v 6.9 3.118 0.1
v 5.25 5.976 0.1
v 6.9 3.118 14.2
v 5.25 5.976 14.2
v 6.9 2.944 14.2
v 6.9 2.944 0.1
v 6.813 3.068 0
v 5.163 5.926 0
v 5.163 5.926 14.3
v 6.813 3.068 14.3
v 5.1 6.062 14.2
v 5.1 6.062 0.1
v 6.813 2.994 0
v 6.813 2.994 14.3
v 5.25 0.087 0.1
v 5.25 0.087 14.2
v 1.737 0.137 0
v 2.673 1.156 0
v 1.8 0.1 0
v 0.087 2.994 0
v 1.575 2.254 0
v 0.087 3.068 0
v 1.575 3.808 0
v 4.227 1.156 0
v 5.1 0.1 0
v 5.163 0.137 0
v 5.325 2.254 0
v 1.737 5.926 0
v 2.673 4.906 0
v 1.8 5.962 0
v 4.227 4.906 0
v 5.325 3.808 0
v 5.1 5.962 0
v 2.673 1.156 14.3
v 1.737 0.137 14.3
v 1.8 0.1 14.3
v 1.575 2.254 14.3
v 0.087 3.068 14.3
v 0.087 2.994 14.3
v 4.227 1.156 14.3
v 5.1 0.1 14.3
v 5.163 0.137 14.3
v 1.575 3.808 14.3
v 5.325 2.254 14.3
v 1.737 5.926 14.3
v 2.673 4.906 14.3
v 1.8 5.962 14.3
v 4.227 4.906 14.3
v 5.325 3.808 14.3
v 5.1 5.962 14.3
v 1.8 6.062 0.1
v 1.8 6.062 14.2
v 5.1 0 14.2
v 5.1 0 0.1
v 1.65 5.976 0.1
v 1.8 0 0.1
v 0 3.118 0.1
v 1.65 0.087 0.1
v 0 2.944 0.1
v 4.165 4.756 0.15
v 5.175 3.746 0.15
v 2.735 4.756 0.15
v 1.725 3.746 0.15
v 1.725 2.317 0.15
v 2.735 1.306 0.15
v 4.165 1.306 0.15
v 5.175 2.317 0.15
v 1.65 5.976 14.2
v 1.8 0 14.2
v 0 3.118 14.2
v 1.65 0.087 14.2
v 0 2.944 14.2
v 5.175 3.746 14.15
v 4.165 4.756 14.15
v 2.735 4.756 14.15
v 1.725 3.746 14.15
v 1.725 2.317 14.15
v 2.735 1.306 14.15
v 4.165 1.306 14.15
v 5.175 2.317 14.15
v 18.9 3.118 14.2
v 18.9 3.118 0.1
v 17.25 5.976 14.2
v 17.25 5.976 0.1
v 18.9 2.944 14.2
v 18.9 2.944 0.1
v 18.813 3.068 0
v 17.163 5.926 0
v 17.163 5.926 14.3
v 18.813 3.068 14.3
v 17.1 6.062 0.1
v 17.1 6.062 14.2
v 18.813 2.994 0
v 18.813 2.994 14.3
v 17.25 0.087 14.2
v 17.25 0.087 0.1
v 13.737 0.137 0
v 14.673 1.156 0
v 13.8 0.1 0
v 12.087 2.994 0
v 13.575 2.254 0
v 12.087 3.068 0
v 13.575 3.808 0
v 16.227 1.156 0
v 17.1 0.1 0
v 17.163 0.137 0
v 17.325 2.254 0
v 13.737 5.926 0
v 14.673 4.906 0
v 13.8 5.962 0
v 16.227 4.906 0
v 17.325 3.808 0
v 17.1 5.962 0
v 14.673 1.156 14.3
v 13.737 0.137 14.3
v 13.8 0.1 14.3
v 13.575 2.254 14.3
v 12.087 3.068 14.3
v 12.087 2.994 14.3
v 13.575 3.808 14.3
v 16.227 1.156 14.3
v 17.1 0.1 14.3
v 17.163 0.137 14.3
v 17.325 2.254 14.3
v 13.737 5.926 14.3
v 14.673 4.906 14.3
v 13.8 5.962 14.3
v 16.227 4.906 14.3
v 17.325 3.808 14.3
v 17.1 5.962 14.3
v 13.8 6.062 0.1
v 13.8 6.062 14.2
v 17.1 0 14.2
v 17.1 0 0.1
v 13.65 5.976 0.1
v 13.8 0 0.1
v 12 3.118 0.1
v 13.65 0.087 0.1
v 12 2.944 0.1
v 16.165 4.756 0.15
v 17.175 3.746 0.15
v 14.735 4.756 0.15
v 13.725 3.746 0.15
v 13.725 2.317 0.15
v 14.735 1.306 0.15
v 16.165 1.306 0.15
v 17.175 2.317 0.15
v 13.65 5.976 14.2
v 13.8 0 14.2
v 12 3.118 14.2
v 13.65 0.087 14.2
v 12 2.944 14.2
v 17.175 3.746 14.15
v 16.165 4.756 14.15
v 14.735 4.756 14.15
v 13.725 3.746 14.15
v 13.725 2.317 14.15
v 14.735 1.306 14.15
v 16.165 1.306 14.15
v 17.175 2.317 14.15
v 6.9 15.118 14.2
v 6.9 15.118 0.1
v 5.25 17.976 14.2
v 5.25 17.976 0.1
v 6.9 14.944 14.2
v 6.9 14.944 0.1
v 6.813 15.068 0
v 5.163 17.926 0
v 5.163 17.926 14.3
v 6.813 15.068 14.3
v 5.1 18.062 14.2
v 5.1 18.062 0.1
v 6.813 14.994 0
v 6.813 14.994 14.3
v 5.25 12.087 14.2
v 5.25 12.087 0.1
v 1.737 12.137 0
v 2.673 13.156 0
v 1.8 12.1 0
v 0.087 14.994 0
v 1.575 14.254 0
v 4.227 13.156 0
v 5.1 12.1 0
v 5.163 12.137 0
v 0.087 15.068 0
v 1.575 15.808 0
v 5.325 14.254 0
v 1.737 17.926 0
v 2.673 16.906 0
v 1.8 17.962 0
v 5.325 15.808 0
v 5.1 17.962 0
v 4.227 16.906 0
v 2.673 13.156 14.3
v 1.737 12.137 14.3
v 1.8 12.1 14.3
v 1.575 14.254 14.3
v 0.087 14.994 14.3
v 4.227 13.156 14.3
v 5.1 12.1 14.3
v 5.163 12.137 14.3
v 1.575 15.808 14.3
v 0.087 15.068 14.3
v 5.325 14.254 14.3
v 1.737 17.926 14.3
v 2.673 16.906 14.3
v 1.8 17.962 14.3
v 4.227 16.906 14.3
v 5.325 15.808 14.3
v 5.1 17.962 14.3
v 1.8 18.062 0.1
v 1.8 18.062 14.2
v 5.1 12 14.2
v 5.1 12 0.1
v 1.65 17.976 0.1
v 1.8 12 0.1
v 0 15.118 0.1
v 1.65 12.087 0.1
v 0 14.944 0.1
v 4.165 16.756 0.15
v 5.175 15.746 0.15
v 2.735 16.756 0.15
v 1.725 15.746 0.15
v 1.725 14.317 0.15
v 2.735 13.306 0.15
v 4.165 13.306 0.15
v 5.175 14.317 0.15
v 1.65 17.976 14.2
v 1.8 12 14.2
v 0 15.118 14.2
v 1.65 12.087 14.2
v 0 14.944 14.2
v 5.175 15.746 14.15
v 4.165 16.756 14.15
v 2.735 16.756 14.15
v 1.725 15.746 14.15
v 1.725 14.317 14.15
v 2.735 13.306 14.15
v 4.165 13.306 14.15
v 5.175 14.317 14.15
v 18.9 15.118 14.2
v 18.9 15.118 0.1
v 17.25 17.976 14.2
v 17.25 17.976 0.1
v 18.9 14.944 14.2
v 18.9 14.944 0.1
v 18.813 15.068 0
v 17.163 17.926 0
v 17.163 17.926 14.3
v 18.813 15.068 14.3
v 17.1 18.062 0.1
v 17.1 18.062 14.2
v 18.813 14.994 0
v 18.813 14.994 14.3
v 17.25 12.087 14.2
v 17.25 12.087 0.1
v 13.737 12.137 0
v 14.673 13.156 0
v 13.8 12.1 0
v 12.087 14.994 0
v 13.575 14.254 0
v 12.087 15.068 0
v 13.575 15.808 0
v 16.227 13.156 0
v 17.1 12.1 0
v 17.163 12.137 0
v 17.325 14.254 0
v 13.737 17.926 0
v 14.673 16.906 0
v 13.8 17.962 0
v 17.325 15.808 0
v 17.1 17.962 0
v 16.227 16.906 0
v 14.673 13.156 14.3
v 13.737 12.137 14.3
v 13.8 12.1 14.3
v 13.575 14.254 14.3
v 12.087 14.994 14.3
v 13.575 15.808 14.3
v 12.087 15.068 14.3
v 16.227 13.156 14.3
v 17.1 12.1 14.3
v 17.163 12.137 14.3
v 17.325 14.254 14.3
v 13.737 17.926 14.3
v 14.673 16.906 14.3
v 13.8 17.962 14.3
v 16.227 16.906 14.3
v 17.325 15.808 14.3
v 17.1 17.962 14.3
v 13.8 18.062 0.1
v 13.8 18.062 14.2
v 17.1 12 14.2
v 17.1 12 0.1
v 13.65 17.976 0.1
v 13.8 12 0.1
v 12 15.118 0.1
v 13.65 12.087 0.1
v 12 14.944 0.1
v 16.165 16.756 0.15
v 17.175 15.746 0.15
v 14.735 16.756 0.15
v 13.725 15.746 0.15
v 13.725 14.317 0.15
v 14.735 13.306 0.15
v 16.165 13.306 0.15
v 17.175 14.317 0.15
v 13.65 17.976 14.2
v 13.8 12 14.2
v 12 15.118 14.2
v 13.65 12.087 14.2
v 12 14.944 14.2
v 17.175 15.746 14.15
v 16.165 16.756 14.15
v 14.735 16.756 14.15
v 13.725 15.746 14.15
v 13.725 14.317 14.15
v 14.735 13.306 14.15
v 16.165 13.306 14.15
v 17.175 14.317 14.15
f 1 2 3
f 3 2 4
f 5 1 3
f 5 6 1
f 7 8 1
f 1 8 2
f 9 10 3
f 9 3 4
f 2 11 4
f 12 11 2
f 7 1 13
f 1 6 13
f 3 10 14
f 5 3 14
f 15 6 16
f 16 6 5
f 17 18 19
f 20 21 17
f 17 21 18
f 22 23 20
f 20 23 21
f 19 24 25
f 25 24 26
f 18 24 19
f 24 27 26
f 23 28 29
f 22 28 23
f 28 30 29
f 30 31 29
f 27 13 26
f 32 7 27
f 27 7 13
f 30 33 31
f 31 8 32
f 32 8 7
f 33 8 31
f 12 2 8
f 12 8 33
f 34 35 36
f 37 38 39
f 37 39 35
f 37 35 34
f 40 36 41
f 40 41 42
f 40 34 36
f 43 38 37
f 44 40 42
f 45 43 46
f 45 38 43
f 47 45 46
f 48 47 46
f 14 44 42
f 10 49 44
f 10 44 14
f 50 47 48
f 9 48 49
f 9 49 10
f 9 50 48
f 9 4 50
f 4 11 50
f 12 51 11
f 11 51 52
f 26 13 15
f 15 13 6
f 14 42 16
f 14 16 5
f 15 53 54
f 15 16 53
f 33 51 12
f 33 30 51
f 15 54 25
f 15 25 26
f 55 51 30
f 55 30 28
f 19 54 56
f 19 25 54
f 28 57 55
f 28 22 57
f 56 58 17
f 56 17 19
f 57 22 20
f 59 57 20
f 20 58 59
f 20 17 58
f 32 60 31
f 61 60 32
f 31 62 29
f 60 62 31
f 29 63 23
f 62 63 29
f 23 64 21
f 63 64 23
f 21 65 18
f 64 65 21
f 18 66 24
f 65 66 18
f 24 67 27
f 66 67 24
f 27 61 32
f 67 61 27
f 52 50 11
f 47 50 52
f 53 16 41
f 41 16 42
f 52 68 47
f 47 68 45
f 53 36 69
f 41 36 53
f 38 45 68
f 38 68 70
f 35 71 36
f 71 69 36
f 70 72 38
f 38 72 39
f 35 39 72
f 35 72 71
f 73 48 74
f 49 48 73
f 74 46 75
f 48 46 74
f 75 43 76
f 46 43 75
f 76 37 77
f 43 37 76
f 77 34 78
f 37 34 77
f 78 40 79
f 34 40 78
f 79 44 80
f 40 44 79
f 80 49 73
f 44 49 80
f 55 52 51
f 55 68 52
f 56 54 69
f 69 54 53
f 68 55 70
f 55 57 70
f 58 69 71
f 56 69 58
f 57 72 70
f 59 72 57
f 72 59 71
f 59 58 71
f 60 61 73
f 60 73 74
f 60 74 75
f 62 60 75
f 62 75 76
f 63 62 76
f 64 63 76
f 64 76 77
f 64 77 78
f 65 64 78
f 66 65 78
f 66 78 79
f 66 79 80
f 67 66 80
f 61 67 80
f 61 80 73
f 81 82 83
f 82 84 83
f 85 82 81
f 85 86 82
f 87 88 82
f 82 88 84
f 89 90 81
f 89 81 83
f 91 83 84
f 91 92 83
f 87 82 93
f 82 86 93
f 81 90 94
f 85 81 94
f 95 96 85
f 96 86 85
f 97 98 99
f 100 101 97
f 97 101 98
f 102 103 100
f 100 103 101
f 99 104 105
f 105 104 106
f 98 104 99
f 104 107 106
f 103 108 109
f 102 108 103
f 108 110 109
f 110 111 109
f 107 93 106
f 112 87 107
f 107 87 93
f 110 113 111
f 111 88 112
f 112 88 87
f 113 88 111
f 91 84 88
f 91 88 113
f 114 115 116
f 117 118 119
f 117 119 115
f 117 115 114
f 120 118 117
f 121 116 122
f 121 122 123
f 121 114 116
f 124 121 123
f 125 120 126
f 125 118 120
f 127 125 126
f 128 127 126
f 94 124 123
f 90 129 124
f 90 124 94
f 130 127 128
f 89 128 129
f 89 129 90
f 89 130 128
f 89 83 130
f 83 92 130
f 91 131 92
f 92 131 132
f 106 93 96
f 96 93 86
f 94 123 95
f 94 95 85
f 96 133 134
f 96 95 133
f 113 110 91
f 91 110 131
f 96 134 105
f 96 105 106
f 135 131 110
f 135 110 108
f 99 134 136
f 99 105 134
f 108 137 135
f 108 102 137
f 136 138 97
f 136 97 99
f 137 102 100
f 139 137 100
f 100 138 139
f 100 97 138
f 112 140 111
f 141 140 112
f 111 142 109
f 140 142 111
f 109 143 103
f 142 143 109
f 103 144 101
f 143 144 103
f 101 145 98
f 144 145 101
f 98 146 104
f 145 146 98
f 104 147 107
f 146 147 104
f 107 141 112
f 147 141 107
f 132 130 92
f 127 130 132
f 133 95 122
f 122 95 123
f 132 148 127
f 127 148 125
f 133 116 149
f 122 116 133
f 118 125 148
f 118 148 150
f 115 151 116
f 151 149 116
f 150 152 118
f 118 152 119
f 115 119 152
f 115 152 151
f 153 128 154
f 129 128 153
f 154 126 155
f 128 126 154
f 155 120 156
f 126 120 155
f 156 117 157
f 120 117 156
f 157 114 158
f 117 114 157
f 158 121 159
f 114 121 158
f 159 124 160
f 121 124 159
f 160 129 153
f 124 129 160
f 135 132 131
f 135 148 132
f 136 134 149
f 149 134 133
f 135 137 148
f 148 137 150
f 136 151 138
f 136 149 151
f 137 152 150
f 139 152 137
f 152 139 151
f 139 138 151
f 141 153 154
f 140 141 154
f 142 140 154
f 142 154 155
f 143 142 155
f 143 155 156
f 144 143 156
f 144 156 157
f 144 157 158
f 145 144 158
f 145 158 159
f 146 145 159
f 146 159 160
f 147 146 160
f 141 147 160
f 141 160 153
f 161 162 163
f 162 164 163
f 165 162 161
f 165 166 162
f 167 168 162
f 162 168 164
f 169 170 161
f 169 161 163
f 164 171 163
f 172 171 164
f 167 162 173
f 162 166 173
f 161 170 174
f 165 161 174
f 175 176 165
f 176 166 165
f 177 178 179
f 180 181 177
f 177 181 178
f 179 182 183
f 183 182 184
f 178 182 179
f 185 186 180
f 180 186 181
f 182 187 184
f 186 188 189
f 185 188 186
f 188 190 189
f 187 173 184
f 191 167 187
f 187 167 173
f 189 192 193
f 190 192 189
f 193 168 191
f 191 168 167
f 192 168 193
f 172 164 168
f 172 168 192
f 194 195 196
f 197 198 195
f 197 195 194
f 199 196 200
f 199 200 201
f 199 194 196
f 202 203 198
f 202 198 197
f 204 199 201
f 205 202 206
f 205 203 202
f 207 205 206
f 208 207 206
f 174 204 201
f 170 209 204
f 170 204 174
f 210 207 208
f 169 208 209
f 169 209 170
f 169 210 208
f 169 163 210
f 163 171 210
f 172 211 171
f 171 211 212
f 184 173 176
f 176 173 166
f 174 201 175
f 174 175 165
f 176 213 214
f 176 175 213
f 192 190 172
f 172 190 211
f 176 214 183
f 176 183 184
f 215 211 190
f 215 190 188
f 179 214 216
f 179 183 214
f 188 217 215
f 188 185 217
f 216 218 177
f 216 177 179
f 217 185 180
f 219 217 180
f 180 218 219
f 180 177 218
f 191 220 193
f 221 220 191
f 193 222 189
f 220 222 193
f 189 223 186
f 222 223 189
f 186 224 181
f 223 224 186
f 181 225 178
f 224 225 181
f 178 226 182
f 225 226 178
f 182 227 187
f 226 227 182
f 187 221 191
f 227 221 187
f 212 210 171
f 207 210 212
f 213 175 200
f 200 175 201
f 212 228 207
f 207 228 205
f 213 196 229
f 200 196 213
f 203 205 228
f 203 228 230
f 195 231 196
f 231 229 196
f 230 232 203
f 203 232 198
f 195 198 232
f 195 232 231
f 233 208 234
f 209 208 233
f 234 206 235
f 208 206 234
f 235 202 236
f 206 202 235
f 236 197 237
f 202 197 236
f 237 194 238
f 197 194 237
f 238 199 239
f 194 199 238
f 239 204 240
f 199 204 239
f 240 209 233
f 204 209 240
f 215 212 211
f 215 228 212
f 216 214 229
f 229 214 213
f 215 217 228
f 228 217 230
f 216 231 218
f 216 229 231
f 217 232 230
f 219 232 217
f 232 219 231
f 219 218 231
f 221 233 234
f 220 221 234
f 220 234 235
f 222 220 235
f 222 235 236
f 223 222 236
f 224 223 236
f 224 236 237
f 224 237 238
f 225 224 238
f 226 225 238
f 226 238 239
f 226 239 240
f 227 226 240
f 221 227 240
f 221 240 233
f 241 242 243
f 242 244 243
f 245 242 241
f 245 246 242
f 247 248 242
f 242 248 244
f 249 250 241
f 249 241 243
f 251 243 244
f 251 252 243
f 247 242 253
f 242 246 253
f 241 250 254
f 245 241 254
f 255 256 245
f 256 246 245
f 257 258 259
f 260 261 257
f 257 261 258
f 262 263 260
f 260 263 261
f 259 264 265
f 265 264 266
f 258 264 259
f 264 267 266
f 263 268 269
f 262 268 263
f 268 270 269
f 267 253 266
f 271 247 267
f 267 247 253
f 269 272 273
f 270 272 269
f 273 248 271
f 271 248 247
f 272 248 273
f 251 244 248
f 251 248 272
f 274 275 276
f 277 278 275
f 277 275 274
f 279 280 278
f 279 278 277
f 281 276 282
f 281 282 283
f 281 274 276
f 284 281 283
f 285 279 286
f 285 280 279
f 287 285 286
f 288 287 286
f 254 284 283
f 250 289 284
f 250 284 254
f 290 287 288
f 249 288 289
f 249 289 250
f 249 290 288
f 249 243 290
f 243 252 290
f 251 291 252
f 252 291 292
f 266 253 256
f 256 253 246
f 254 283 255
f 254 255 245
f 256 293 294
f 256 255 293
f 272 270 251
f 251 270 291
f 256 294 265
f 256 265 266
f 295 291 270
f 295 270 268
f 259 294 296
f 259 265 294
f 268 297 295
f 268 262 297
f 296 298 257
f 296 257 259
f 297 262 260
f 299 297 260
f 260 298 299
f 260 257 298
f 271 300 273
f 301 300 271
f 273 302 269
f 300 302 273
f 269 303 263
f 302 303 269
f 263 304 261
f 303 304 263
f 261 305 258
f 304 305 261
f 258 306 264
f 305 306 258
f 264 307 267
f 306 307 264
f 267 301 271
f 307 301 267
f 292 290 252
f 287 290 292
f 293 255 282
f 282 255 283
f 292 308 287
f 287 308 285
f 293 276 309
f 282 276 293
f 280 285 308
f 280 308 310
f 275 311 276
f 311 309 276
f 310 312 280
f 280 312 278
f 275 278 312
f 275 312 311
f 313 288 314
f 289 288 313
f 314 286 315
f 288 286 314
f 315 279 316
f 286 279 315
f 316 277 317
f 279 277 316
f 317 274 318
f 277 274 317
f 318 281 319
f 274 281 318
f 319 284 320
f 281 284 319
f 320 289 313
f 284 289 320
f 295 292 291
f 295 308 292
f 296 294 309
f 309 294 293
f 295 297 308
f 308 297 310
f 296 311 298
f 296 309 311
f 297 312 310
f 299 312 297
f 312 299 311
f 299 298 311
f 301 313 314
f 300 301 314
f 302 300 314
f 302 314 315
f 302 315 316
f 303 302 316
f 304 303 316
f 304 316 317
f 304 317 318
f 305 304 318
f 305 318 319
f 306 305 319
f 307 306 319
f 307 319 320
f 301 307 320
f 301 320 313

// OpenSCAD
// Generated variant: spec/build_parent_main_polygon.py.
polyhedron(points=[[6.900000095367432, 3.1176915168762207, 0.10000009834766388], [5.25, 5.9755754470825195, 0.10000009834766388], [6.900000095367432, 3.1176915168762207, 14.199999809265137], [5.25, 5.9755754470825195, 14.199999809265137], [6.900000095367432, 2.944486379623413, 14.199999809265137], [6.900000095367432, 2.944486379623413, 0.10000009834766388], [6.813397407531738, 3.0676915645599365, 1.0000000116860974e-07], [5.163397312164307, 5.925575256347656, 1.0000000116860974e-07], [5.163397312164307, 5.925575256347656, 14.300000190734863], [6.813397407531738, 3.0676915645599365, 14.300000190734863], [5.099999904632568, 6.062177658081055, 14.199999809265137], [5.099999904632568, 6.062177658081055, 0.10000009834766388], [6.813397407531738, 2.9944863319396973, 1.0000000116860974e-07], [6.813397407531738, 2.9944863319396973, 14.300000190734863], [5.25, 0.08660253882408142, 0.10000009834766388], [5.25, 0.08660253882408142, 14.199999809265137], [1.736602544784546, 0.13660253584384918, 1.0000000116860974e-07], [2.673349618911743, 1.156088948249817, 1.0000000116860974e-07], [1.7999999523162842, 0.10000000149011612, 1.0000000116860974e-07], [0.08660253882408142, 2.9944863319396973, 1.0000000116860974e-07], [1.5750000476837158, 2.2544384002685547, 1.0000000116860974e-07], [0.08660253882408142, 3.0676915645599365, 1.0000000116860974e-07], [1.5750000476837158, 3.8077392578125, 1.0000000116860974e-07], [4.226650238037109, 1.156088948249817, 1.0000000116860974e-07], [5.099999904632568, 0.10000000149011612, 1.0000000116860974e-07], [5.163397312164307, 0.13660253584384918, 1.0000000116860974e-07], [5.324999809265137, 2.2544384002685547, 1.0000000116860974e-07], [1.736602544784546, 5.925575256347656, 1.0000000116860974e-07], [2.673349618911743, 4.906088829040527, 1.0000000116860974e-07], [1.7999999523162842, 5.962177753448486, 1.0000000116860974e-07], [4.226650238037109, 4.906088829040527, 1.0000000116860974e-07], [5.324999809265137, 3.8077392578125, 1.0000000116860974e-07], [5.099999904632568, 5.962177753448486, 1.0000000116860974e-07], [2.673349618911743, 1.156088948249817, 14.300000190734863], [1.736602544784546, 0.13660253584384918, 14.300000190734863], [1.7999999523162842, 0.10000000149011612, 14.300000190734863], [1.5750000476837158, 2.2544384002685547, 14.300000190734863], [0.08660253882408142, 3.0676915645599365, 14.300000190734863], [0.08660253882408142, 2.9944863319396973, 14.300000190734863], [4.226650238037109, 1.156088948249817, 14.300000190734863], [5.099999904632568, 0.10000000149011612, 14.300000190734863], [5.163397312164307, 0.13660253584384918, 14.300000190734863], [1.5750000476837158, 3.8077392578125, 14.300000190734863], [5.324999809265137, 2.2544384002685547, 14.300000190734863], [1.736602544784546, 5.925575256347656, 14.300000190734863], [2.673349618911743, 4.906088829040527, 14.300000190734863], [1.7999999523162842, 5.962177753448486, 14.300000190734863], [4.226650238037109, 4.906088829040527, 14.300000190734863], [5.324999809265137, 3.8077392578125, 14.300000190734863], [5.099999904632568, 5.962177753448486, 14.300000190734863], [1.7999999523162842, 6.062177658081055, 0.10000009834766388], [1.7999999523162842, 6.062177658081055, 14.199999809265137], [5.099999904632568, 4.440892098500626e-16, 14.199999809265137], [5.099999904632568, 0.0, 0.10000009834766388], [1.649999976158142, 5.9755754470825195, 0.10000009834766388], [1.7999999523162842, 4.440892098500626e-16, 0.10000009834766388], [1.7763568394002505e-15, 3.1176915168762207, 0.10000009834766388], [1.649999976158142, 0.08660253882408142, 0.10000009834766388], [1.7763568394002505e-15, 2.944486379623413, 0.10000009834766388], [4.164518356323242, 4.756088733673096, 0.15000009536743164], [5.175000190734863, 3.745607376098633, 0.15000009536743164], [2.7354815006256104, 4.756088733673096, 0.15000009536743164], [1.725000023841858, 3.745607376098633, 0.15000009536743164], [1.725000023841858, 2.316570520401001, 0.15000009536743164], [2.7354815006256104, 1.306088924407959, 0.15000009536743164], [4.164518356323242, 1.306088924407959, 0.15000009536743164], [5.175000190734863, 2.316570520401001, 0.15000009536743164], [1.649999976158142, 5.9755754470825195, 14.199999809265137], [1.7999999523162842, 8.881784197001252e-16, 14.199999809265137], [8.881784197001252e-16, 3.1176915168762207, 14.199999809265137], [1.649999976158142, 0.08660253882408142, 14.199999809265137], [1.7763568394002505e-15, 2.944486379623413, 14.199999809265137], [5.175000190734863, 3.745607376098633, 14.15000057220459], [4.164518356323242, 4.756088733673096, 14.15000057220459], [2.7354815006256104, 4.756088733673096, 14.15000057220459], [1.725000023841858, 3.745607376098633, 14.15000057220459], [1.725000023841858, 2.316570520401001, 14.15000057220459], [2.7354815006256104, 1.306088924407959, 14.15000057220459], [4.164518356323242, 1.306088924407959, 14.15000057220459], [5.175000190734863, 2.316570520401001, 14.15000057220459], [18.899999618530273, 3.1176915168762207, 14.199999809265137], [18.899999618530273, 3.1176915168762207, 0.10000009834766388], [17.25, 5.9755754470825195, 14.199999809265137], [17.25, 5.9755754470825195, 0.10000009834766388], [18.899999618530273, 2.944486379623413, 14.199999809265137], [18.899999618530273, 2.944486379623413, 0.10000009834766388], [18.813398361206055, 3.0676915645599365, 1.0000000116860974e-07], [17.16339683532715, 5.925575256347656, 1.0000000116860974e-07], [17.16339683532715, 5.925575256347656, 14.300000190734863], [18.813398361206055, 3.0676915645599365, 14.300000190734863], [17.100000381469727, 6.062177658081055, 0.10000009834766388], [17.100000381469727, 6.062177658081055, 14.199999809265137], [18.813398361206055, 2.9944863319396973, 1.0000000116860974e-07], [18.813398361206055, 2.9944863319396973, 14.300000190734863], [17.25, 0.08660253882408142, 14.199999809265137], [17.25, 0.08660253882408142, 0.10000009834766388], [13.736602783203125, 0.13660253584384918, 1.0000000116860974e-07], [14.673349380493164, 1.156088948249817, 1.0000000116860974e-07], [13.800000190734863, 0.10000000149011612, 1.0000000116860974e-07], [12.086602210998535, 2.9944863319396973, 1.0000000116860974e-07], [13.574999809265137, 2.2544384002685547, 1.0000000116860974e-07], [12.086602210998535, 3.0676915645599365, 1.0000000116860974e-07], [13.574999809265137, 3.8077392578125, 1.0000000116860974e-07], [16.22665023803711, 1.156088948249817, 1.0000000116860974e-07], [17.100000381469727, 0.10000000149011612, 1.0000000116860974e-07], [17.16339683532715, 0.13660253584384918, 1.0000000116860974e-07], [17.325000762939453, 2.2544384002685547, 1.0000000116860974e-07], [13.736602783203125, 5.925575256347656, 1.0000000116860974e-07], [14.673349380493164, 4.906088829040527, 1.0000000116860974e-07], [13.800000190734863, 5.962177753448486, 1.0000000116860974e-07], [16.22665023803711, 4.906088829040527, 1.0000000116860974e-07], [17.325000762939453, 3.8077392578125, 1.0000000116860974e-07], [17.100000381469727, 5.962177753448486, 1.0000000116860974e-07], [14.673349380493164, 1.156088948249817, 14.300000190734863], [13.736602783203125, 0.13660253584384918, 14.300000190734863], [13.800000190734863, 0.10000000149011612, 14.300000190734863], [13.574999809265137, 2.2544384002685547, 14.300000190734863], [12.086602210998535, 3.0676915645599365, 14.300000190734863], [12.086602210998535, 2.9944863319396973, 14.300000190734863], [13.574999809265137, 3.8077392578125, 14.300000190734863], [16.22665023803711, 1.156088948249817, 14.300000190734863], [17.100000381469727, 0.10000000149011612, 14.300000190734863], [17.16339683532715, 0.13660253584384918, 14.300000190734863], [17.325000762939453, 2.2544384002685547, 14.300000190734863], [13.736602783203125, 5.925575256347656, 14.300000190734863], [14.673349380493164, 4.906088829040527, 14.300000190734863], [13.800000190734863, 5.962177753448486, 14.300000190734863], [16.22665023803711, 4.906088829040527, 14.300000190734863], [17.325000762939453, 3.8077392578125, 14.300000190734863], [17.100000381469727, 5.962177753448486, 14.300000190734863], [13.800000190734863, 6.062177658081055, 0.10000009834766388], [13.800000190734863, 6.062177658081055, 14.199999809265137], [17.100000381469727, 4.440892098500626e-16, 14.199999809265137], [17.100000381469727, 0.0, 0.10000009834766388], [13.649999618530273, 5.9755754470825195, 0.10000009834766388], [13.800000190734863, 4.440892098500626e-16, 0.10000009834766388], [12.0, 3.1176915168762207, 0.10000009834766388], [13.649999618530273, 0.08660253882408142, 0.10000009834766388], [12.0, 2.944486379623413, 0.10000009834766388], [16.164518356323242, 4.756088733673096, 0.15000009536743164], [17.174999237060547, 3.745607376098633, 0.15000009536743164], [14.735481262207031, 4.756088733673096, 0.15000009536743164], [13.725000381469727, 3.745607376098633, 0.15000009536743164], [13.725000381469727, 2.316570520401001, 0.15000009536743164], [14.735481262207031, 1.306088924407959, 0.15000009536743164], [16.164518356323242, 1.306088924407959, 0.15000009536743164], [17.174999237060547, 2.316570520401001, 0.15000009536743164], [13.649999618530273, 5.9755754470825195, 14.199999809265137], [13.800000190734863, 8.881784197001252e-16, 14.199999809265137], [12.0, 3.1176915168762207, 14.199999809265137], [13.649999618530273, 0.08660253882408142, 14.199999809265137], [12.0, 2.944486379623413, 14.199999809265137], [17.174999237060547, 3.745607376098633, 14.15000057220459], [16.164518356323242, 4.756088733673096, 14.15000057220459], [14.735481262207031, 4.756088733673096, 14.15000057220459], [13.725000381469727, 3.745607376098633, 14.15000057220459], [13.725000381469727, 2.316570520401001, 14.15000057220459], [14.735481262207031, 1.306088924407959, 14.15000057220459], [16.164518356323242, 1.306088924407959, 14.15000057220459], [17.174999237060547, 2.316570520401001, 14.15000057220459], [6.900000095367432, 15.117691040039062, 14.199999809265137], [6.900000095367432, 15.117691040039062, 0.10000009834766388], [5.25, 17.975574493408203, 14.199999809265137], [5.25, 17.975574493408203, 0.10000009834766388], [6.900000095367432, 14.944486618041992, 14.199999809265137], [6.900000095367432, 14.944486618041992, 0.10000009834766388], [6.813397407531738, 15.067691802978516, 1.0000000116860974e-07], [5.163397312164307, 17.925575256347656, 1.0000000116860974e-07], [5.163397312164307, 17.925575256347656, 14.300000190734863], [6.813397407531738, 15.067691802978516, 14.300000190734863], [5.099999904632568, 18.062177658081055, 14.199999809265137], [5.099999904632568, 18.062177658081055, 0.10000009834766388], [6.813397407531738, 14.994486808776855, 1.0000000116860974e-07], [6.813397407531738, 14.994486808776855, 14.300000190734863], [5.25, 12.086602210998535, 14.199999809265137], [5.25, 12.086602210998535, 0.10000009834766388], [1.736602544784546, 12.136602401733398, 1.0000000116860974e-07], [2.673349618911743, 13.156088829040527, 1.0000000116860974e-07], [1.7999999523162842, 12.100000381469727, 1.0000000116860974e-07], [0.08660253882408142, 14.994486808776855, 1.0000000116860974e-07], [1.5750000476837158, 14.254438400268555, 1.0000000116860974e-07], [4.226650238037109, 13.156088829040527, 1.0000000116860974e-07], [5.099999904632568, 12.100000381469727, 1.0000000116860974e-07], [5.163397312164307, 12.136602401733398, 1.0000000116860974e-07], [0.08660253882408142, 15.067691802978516, 1.0000000116860974e-07], [1.5750000476837158, 15.8077392578125, 1.0000000116860974e-07], [5.324999809265137, 14.254438400268555, 1.0000000116860974e-07], [1.736602544784546, 17.925575256347656, 1.0000000116860974e-07], [2.673349618911743, 16.906089782714844, 1.0000000116860974e-07], [1.7999999523162842, 17.962177276611328, 1.0000000116860974e-07], [5.324999809265137, 15.8077392578125, 1.0000000116860974e-07], [5.099999904632568, 17.962177276611328, 1.0000000116860974e-07], [4.226650238037109, 16.906089782714844, 1.0000000116860974e-07], [2.673349618911743, 13.156088829040527, 14.300000190734863], [1.736602544784546, 12.136602401733398, 14.300000190734863], [1.7999999523162842, 12.100000381469727, 14.300000190734863], [1.5750000476837158, 14.254438400268555, 14.300000190734863], [0.08660253882408142, 14.994486808776855, 14.300000190734863], [4.226650238037109, 13.156088829040527, 14.300000190734863], [5.099999904632568, 12.100000381469727, 14.300000190734863], [5.163397312164307, 12.136602401733398, 14.300000190734863], [1.5750000476837158, 15.8077392578125, 14.300000190734863], [0.08660253882408142, 15.067691802978516, 14.300000190734863], [5.324999809265137, 14.254438400268555, 14.300000190734863], [1.736602544784546, 17.925575256347656, 14.300000190734863], [2.673349618911743, 16.906089782714844, 14.300000190734863], [1.7999999523162842, 17.962177276611328, 14.300000190734863], [4.226650238037109, 16.906089782714844, 14.300000190734863], [5.324999809265137, 15.8077392578125, 14.300000190734863], [5.099999904632568, 17.962177276611328, 14.300000190734863], [1.7999999523162842, 18.062177658081055, 0.10000009834766388], [1.7999999523162842, 18.062177658081055, 14.199999809265137], [5.099999904632568, 12.0, 14.199999809265137], [5.099999904632568, 12.0, 0.10000009834766388], [1.649999976158142, 17.975574493408203, 0.10000009834766388], [1.7999999523162842, 12.0, 0.10000009834766388], [1.7763568394002505e-15, 15.117691040039062, 0.10000009834766388], [1.649999976158142, 12.086602210998535, 0.10000009834766388], [1.7763568394002505e-15, 14.944486618041992, 0.10000009834766388], [4.164518356323242, 16.756088256835938, 0.15000009536743164], [5.175000190734863, 15.745607376098633, 0.15000009536743164], [2.7354815006256104, 16.756088256835938, 0.15000009536743164], [1.725000023841858, 15.745607376098633, 0.15000009536743164], [1.725000023841858, 14.316570281982422, 0.15000009536743164], [2.7354815006256104, 13.3060884475708, 0.15000009536743164], [4.164518356323242, 13.3060884475708, 0.15000009536743164], [5.175000190734863, 14.316570281982422, 0.15000009536743164], [1.649999976158142, 17.975574493408203, 14.199999809265137], [1.7999999523162842, 12.0, 14.199999809265137], [8.881784197001252e-16, 15.117691040039062, 14.199999809265137], [1.649999976158142, 12.086602210998535, 14.199999809265137], [1.7763568394002505e-15, 14.944486618041992, 14.199999809265137], [5.175000190734863, 15.745607376098633, 14.15000057220459], [4.164518356323242, 16.756088256835938, 14.15000057220459], [2.7354815006256104, 16.756088256835938, 14.15000057220459], [1.725000023841858, 15.745607376098633, 14.15000057220459], [1.725000023841858, 14.316570281982422, 14.15000057220459], [2.7354815006256104, 13.3060884475708, 14.15000057220459], [4.164518356323242, 13.3060884475708, 14.15000057220459], [5.175000190734863, 14.316570281982422, 14.15000057220459], [18.899999618530273, 15.117691040039062, 14.199999809265137], [18.899999618530273, 15.117691040039062, 0.10000009834766388], [17.25, 17.975574493408203, 14.199999809265137], [17.25, 17.975574493408203, 0.10000009834766388], [18.899999618530273, 14.944486618041992, 14.199999809265137], [18.899999618530273, 14.944486618041992, 0.10000009834766388], [18.813398361206055, 15.067691802978516, 1.0000000116860974e-07], [17.16339683532715, 17.925575256347656, 1.0000000116860974e-07], [17.16339683532715, 17.925575256347656, 14.300000190734863], [18.813398361206055, 15.067691802978516, 14.300000190734863], [17.100000381469727, 18.062177658081055, 0.10000009834766388], [17.100000381469727, 18.062177658081055, 14.199999809265137], [18.813398361206055, 14.994486808776855, 1.0000000116860974e-07], [18.813398361206055, 14.994486808776855, 14.300000190734863], [17.25, 12.086602210998535, 14.199999809265137], [17.25, 12.086602210998535, 0.10000009834766388], [13.736602783203125, 12.136602401733398, 1.0000000116860974e-07], [14.673349380493164, 13.156088829040527, 1.0000000116860974e-07], [13.800000190734863, 12.100000381469727, 1.0000000116860974e-07], [12.086602210998535, 14.994486808776855, 1.0000000116860974e-07], [13.574999809265137, 14.254438400268555, 1.0000000116860974e-07], [12.086602210998535, 15.067691802978516, 1.0000000116860974e-07], [13.574999809265137, 15.8077392578125, 1.0000000116860974e-07], [16.22665023803711, 13.156088829040527, 1.0000000116860974e-07], [17.100000381469727, 12.100000381469727, 1.0000000116860974e-07], [17.16339683532715, 12.136602401733398, 1.0000000116860974e-07], [17.325000762939453, 14.254438400268555, 1.0000000116860974e-07], [13.736602783203125, 17.925575256347656, 1.0000000116860974e-07], [14.673349380493164, 16.906089782714844, 1.0000000116860974e-07], [13.800000190734863, 17.962177276611328, 1.0000000116860974e-07], [17.325000762939453, 15.8077392578125, 1.0000000116860974e-07], [17.100000381469727, 17.962177276611328, 1.0000000116860974e-07], [16.22665023803711, 16.906089782714844, 1.0000000116860974e-07], [14.673349380493164, 13.156088829040527, 14.300000190734863], [13.736602783203125, 12.136602401733398, 14.300000190734863], [13.800000190734863, 12.100000381469727, 14.300000190734863], [13.574999809265137, 14.254438400268555, 14.300000190734863], [12.086602210998535, 14.994486808776855, 14.300000190734863], [13.574999809265137, 15.8077392578125, 14.300000190734863], [12.086602210998535, 15.067691802978516, 14.300000190734863], [16.22665023803711, 13.156088829040527, 14.300000190734863], [17.100000381469727, 12.100000381469727, 14.300000190734863], [17.16339683532715, 12.136602401733398, 14.300000190734863], [17.325000762939453, 14.254438400268555, 14.300000190734863], [13.736602783203125, 17.925575256347656, 14.300000190734863], [14.673349380493164, 16.906089782714844, 14.300000190734863], [13.800000190734863, 17.962177276611328, 14.300000190734863], [16.22665023803711, 16.906089782714844, 14.300000190734863], [17.325000762939453, 15.8077392578125, 14.300000190734863], [17.100000381469727, 17.962177276611328, 14.300000190734863], [13.800000190734863, 18.062177658081055, 0.10000009834766388], [13.800000190734863, 18.062177658081055, 14.199999809265137], [17.100000381469727, 12.0, 14.199999809265137], [17.100000381469727, 12.0, 0.10000009834766388], [13.649999618530273, 17.975574493408203, 0.10000009834766388], [13.800000190734863, 12.0, 0.10000009834766388], [12.0, 15.117691040039062, 0.10000009834766388], [13.649999618530273, 12.086602210998535, 0.10000009834766388], [12.0, 14.944486618041992, 0.10000009834766388], [16.164518356323242, 16.756088256835938, 0.15000009536743164], [17.174999237060547, 15.745607376098633, 0.15000009536743164], [14.735481262207031, 16.756088256835938, 0.15000009536743164], [13.725000381469727, 15.745607376098633, 0.15000009536743164], [13.725000381469727, 14.316570281982422, 0.15000009536743164], [14.735481262207031, 13.3060884475708, 0.15000009536743164], [16.164518356323242, 13.3060884475708, 0.15000009536743164], [17.174999237060547, 14.316570281982422, 0.15000009536743164], [13.649999618530273, 17.975574493408203, 14.199999809265137], [13.800000190734863, 12.0, 14.199999809265137], [12.0, 15.117691040039062, 14.199999809265137], [13.649999618530273, 12.086602210998535, 14.199999809265137], [12.0, 14.944486618041992, 14.199999809265137], [17.174999237060547, 15.745607376098633, 14.15000057220459], [16.164518356323242, 16.756088256835938, 14.15000057220459], [14.735481262207031, 16.756088256835938, 14.15000057220459], [13.725000381469727, 15.745607376098633, 14.15000057220459], [13.725000381469727, 14.316570281982422, 14.15000057220459], [14.735481262207031, 13.3060884475708, 14.15000057220459], [16.164518356323242, 13.3060884475708, 14.15000057220459], [17.174999237060547, 14.316570281982422, 14.15000057220459]],faces=[[2, 1, 0], [3, 1, 2], [2, 0, 4], [0, 5, 4], [0, 7, 6], [1, 7, 0], [2, 9, 8], [3, 2, 8], [3, 10, 1], [1, 10, 11], [12, 0, 6], [12, 5, 0], [13, 9, 2], [13, 2, 4], [15, 5, 14], [4, 5, 15], [18, 17, 16], [16, 20, 19], [17, 20, 16], [19, 22, 21], [20, 22, 19], [24, 23, 18], [25, 23, 24], [18, 23, 17], [25, 26, 23], [28, 27, 22], [22, 27, 21], [28, 29, 27], [28, 30, 29], [25, 12, 26], [26, 6, 31], [12, 6, 26], [30, 32, 29], [31, 7, 30], [6, 7, 31], [30, 7, 32], [7, 1, 11], [32, 7, 11], [35, 34, 33], [38, 37, 36], [34, 38, 36], [33, 34, 36], [40, 35, 39], [41, 40, 39], [35, 33, 39], [36, 37, 42], [41, 39, 43], [45, 42, 44], [42, 37, 44], [45, 44, 46], [45, 46, 47], [41, 43, 13], [43, 48, 9], [13, 43, 9], [47, 46, 49], [48, 47, 8], [9, 48, 8], [47, 49, 8], [49, 3, 8], [49, 10, 3], [10, 50, 11], [51, 50, 10], [14, 12, 25], [5, 12, 14], [15, 41, 13], [4, 15, 13], [53, 52, 14], [52, 15, 14], [11, 50, 32], [50, 29, 32], [24, 53, 14], [25, 24, 14], [29, 50, 54], [27, 29, 54], [55, 53, 18], [53, 24, 18], [54, 56, 27], [56, 21, 27], [16, 57, 55], [18, 16, 55], [19, 21, 56], [19, 56, 58], [58, 57, 19], [57, 16, 19], [30, 59, 31], [31, 59, 60], [28, 61, 30], [30, 61, 59], [22, 62, 28], [28, 62, 61], [20, 63, 22], [22, 63, 62], [17, 64, 20], [20, 64, 63], [23, 65, 17], [17, 65, 64], [26, 66, 23], [23, 66, 65], [31, 60, 26], [26, 60, 66], [10, 49, 51], [51, 49, 46], [40, 15, 52], [41, 15, 40], [46, 67, 51], [44, 67, 46], [68, 35, 52], [52, 35, 40], [67, 44, 37], [69, 67, 37], [35, 70, 34], [35, 68, 70], [37, 71, 69], [38, 71, 37], [71, 38, 34], [70, 71, 34], [73, 47, 72], [72, 47, 48], [74, 45, 73], [73, 45, 47], [75, 42, 74], [74, 42, 45], [76, 36, 75], [75, 36, 42], [77, 33, 76], [76, 33, 36], [78, 39, 77], [77, 39, 33], [79, 43, 78], [78, 43, 39], [72, 48, 79], [79, 48, 43], [50, 51, 54], [51, 67, 54], [68, 53, 55], [52, 53, 68], [69, 54, 67], [69, 56, 54], [70, 68, 57], [57, 68, 55], [69, 71, 56], [56, 71, 58], [70, 58, 71], [70, 57, 58], [72, 60, 59], [73, 72, 59], [74, 73, 59], [74, 59, 61], [75, 74, 61], [75, 61, 62], [75, 62, 63], [76, 75, 63], [77, 76, 63], [77, 63, 64], [77, 64, 65], [78, 77, 65], [79, 78, 65], [79, 65, 66], [79, 66, 60], [72, 79, 60], [82, 81, 80], [82, 83, 81], [80, 81, 84], [81, 85, 84], [81, 87, 86], [83, 87, 81], [80, 89, 88], [82, 80, 88], [83, 82, 90], [82, 91, 90], [92, 81, 86], [92, 85, 81], [93, 89, 80], [93, 80, 84], [84, 95, 94], [84, 85, 95], [98, 97, 96], [96, 100, 99], [97, 100, 96], [99, 102, 101], [100, 102, 99], [104, 103, 98], [105, 103, 104], [98, 103, 97], [105, 106, 103], [108, 107, 102], [102, 107, 101], [108, 109, 107], [108, 110, 109], [105, 92, 106], [106, 86, 111], [92, 86, 106], [110, 112, 109], [111, 87, 110], [86, 87, 111], [110, 87, 112], [87, 83, 90], [112, 87, 90], [115, 114, 113], [118, 117, 116], [114, 118, 116], [113, 114, 116], [116, 117, 119], [121, 115, 120], [122, 121, 120], [115, 113, 120], [122, 120, 123], [125, 119, 124], [119, 117, 124], [125, 124, 126], [125, 126, 127], [122, 123, 93], [123, 128, 89], [93, 123, 89], [127, 126, 129], [128, 127, 88], [89, 128, 88], [127, 129, 88], [129, 82, 88], [129, 91, 82], [91, 130, 90], [131, 130, 91], [95, 92, 105], [85, 92, 95], [94, 122, 93], [84, 94, 93], [133, 132, 95], [132, 94, 95], [90, 109, 112], [130, 109, 90], [104, 133, 95], [105, 104, 95], [109, 130, 134], [107, 109, 134], [135, 133, 98], [133, 104, 98], [134, 136, 107], [136, 101, 107], [96, 137, 135], [98, 96, 135], [99, 101, 136], [99, 136, 138], [138, 137, 99], [137, 96, 99], [110, 139, 111], [111, 139, 140], [108, 141, 110], [110, 141, 139], [102, 142, 108], [108, 142, 141], [100, 143, 102], [102, 143, 142], [97, 144, 100], [100, 144, 143], [103, 145, 97], [97, 145, 144], [106, 146, 103], [103, 146, 145], [111, 140, 106], [106, 140, 146], [91, 129, 131], [131, 129, 126], [121, 94, 132], [122, 94, 121], [126, 147, 131], [124, 147, 126], [148, 115, 132], [132, 115, 121], [147, 124, 117], [149, 147, 117], [115, 150, 114], [115, 148, 150], [117, 151, 149], [118, 151, 117], [151, 118, 114], [150, 151, 114], [153, 127, 152], [152, 127, 128], [154, 125, 153], [153, 125, 127], [155, 119, 154], [154, 119, 125], [156, 116, 155], [155, 116, 119], [157, 113, 156], [156, 113, 116], [158, 120, 157], [157, 120, 113], [159, 123, 158], [158, 123, 120], [152, 128, 159], [159, 128, 123], [130, 131, 134], [131, 147, 134], [148, 133, 135], [132, 133, 148], [147, 136, 134], [149, 136, 147], [137, 150, 135], [150, 148, 135], [149, 151, 136], [136, 151, 138], [150, 138, 151], [150, 137, 138], [153, 152, 140], [153, 140, 139], [153, 139, 141], [154, 153, 141], [154, 141, 142], [155, 154, 142], [155, 142, 143], [156, 155, 143], [157, 156, 143], [157, 143, 144], [158, 157, 144], [158, 144, 145], [159, 158, 145], [159, 145, 146], [159, 146, 140], [152, 159, 140], [162, 161, 160], [162, 163, 161], [160, 161, 164], [161, 165, 164], [161, 167, 166], [163, 167, 161], [160, 169, 168], [162, 160, 168], [162, 170, 163], [163, 170, 171], [172, 161, 166], [172, 165, 161], [173, 169, 160], [173, 160, 164], [164, 175, 174], [164, 165, 175], [178, 177, 176], [176, 180, 179], [177, 180, 176], [182, 181, 178], [183, 181, 182], [178, 181, 177], [179, 185, 184], [180, 185, 179], [183, 186, 181], [188, 187, 185], [185, 187, 184], [188, 189, 187], [183, 172, 186], [186, 166, 190], [172, 166, 186], [192, 191, 188], [188, 191, 189], [190, 167, 192], [166, 167, 190], [192, 167, 191], [167, 163, 171], [191, 167, 171], [195, 194, 193], [194, 197, 196], [193, 194, 196], [199, 195, 198], [200, 199, 198], [195, 193, 198], [197, 202, 201], [196, 197, 201], [200, 198, 203], [205, 201, 204], [201, 202, 204], [205, 204, 206], [205, 206, 207], [200, 203, 173], [203, 208, 169], [173, 203, 169], [207, 206, 209], [208, 207, 168], [169, 208, 168], [207, 209, 168], [209, 162, 168], [209, 170, 162], [170, 210, 171], [211, 210, 170], [175, 172, 183], [165, 172, 175], [174, 200, 173], [164, 174, 173], [213, 212, 175], [212, 174, 175], [171, 189, 191], [210, 189, 171], [182, 213, 175], [183, 182, 175], [189, 210, 214], [187, 189, 214], [215, 213, 178], [213, 182, 178], [214, 216, 187], [216, 184, 187], [176, 217, 215], [178, 176, 215], [179, 184, 216], [179, 216, 218], [218, 217, 179], [217, 176, 179], [192, 219, 190], [190, 219, 220], [188, 221, 192], [192, 221, 219], [185, 222, 188], [188, 222, 221], [180, 223, 185], [185, 223, 222], [177, 224, 180], [180, 224, 223], [181, 225, 177], [177, 225, 224], [186, 226, 181], [181, 226, 225], [190, 220, 186], [186, 220, 226], [170, 209, 211], [211, 209, 206], [199, 174, 212], [200, 174, 199], [206, 227, 211], [204, 227, 206], [228, 195, 212], [212, 195, 199], [227, 204, 202], [229, 227, 202], [195, 230, 194], [195, 228, 230], [202, 231, 229], [197, 231, 202], [231, 197, 194], [230, 231, 194], [233, 207, 232], [232, 207, 208], [234, 205, 233], [233, 205, 207], [235, 201, 234], [234, 201, 205], [236, 196, 235], [235, 196, 201], [237, 193, 236], [236, 193, 196], [238, 198, 237], [237, 198, 193], [239, 203, 238], [238, 203, 198], [232, 208, 239], [239, 208, 203], [210, 211, 214], [211, 227, 214], [228, 213, 215], [212, 213, 228], [227, 216, 214], [229, 216, 227], [217, 230, 215], [230, 228, 215], [229, 231, 216], [216, 231, 218], [230, 218, 231], [230, 217, 218], [233, 232, 220], [233, 220, 219], [234, 233, 219], [234, 219, 221], [235, 234, 221], [235, 221, 222], [235, 222, 223], [236, 235, 223], [237, 236, 223], [237, 223, 224], [237, 224, 225], [238, 237, 225], [239, 238, 225], [239, 225, 226], [239, 226, 220], [232, 239, 220], [242, 241, 240], [242, 243, 241], [240, 241, 244], [241, 245, 244], [241, 247, 246], [243, 247, 241], [240, 249, 248], [242, 240, 248], [243, 242, 250], [242, 251, 250], [252, 241, 246], [252, 245, 241], [253, 249, 240], [253, 240, 244], [244, 255, 254], [244, 245, 255], [258, 257, 256], [256, 260, 259], [257, 260, 256], [259, 262, 261], [260, 262, 259], [264, 263, 258], [265, 263, 264], [258, 263, 257], [265, 266, 263], [268, 267, 262], [262, 267, 261], [268, 269, 267], [265, 252, 266], [266, 246, 270], [252, 246, 266], [272, 271, 268], [268, 271, 269], [270, 247, 272], [246, 247, 270], [272, 247, 271], [247, 243, 250], [271, 247, 250], [275, 274, 273], [274, 277, 276], [273, 274, 276], [277, 279, 278], [276, 277, 278], [281, 275, 280], [282, 281, 280], [275, 273, 280], [282, 280, 283], [285, 278, 284], [278, 279, 284], [285, 284, 286], [285, 286, 287], [282, 283, 253], [283, 288, 249], [253, 283, 249], [287, 286, 289], [288, 287, 248], [249, 288, 248], [287, 289, 248], [289, 242, 248], [289, 251, 242], [251, 290, 250], [291, 290, 251], [255, 252, 265], [245, 252, 255], [254, 282, 253], [244, 254, 253], [293, 292, 255], [292, 254, 255], [250, 269, 271], [290, 269, 250], [264, 293, 255], [265, 264, 255], [269, 290, 294], [267, 269, 294], [295, 293, 258], [293, 264, 258], [294, 296, 267], [296, 261, 267], [256, 297, 295], [258, 256, 295], [259, 261, 296], [259, 296, 298], [298, 297, 259], [297, 256, 259], [272, 299, 270], [270, 299, 300], [268, 301, 272], [272, 301, 299], [262, 302, 268], [268, 302, 301], [260, 303, 262], [262, 303, 302], [257, 304, 260], [260, 304, 303], [263, 305, 257], [257, 305, 304], [266, 306, 263], [263, 306, 305], [270, 300, 266], [266, 300, 306], [251, 289, 291], [291, 289, 286], [281, 254, 292], [282, 254, 281], [286, 307, 291], [284, 307, 286], [308, 275, 292], [292, 275, 281], [307, 284, 279], [309, 307, 279], [275, 310, 274], [275, 308, 310], [279, 311, 309], [277, 311, 279], [311, 277, 274], [310, 311, 274], [313, 287, 312], [312, 287, 288], [314, 285, 313], [313, 285, 287], [315, 278, 314], [314, 278, 285], [316, 276, 315], [315, 276, 278], [317, 273, 316], [316, 273, 276], [318, 280, 317], [317, 280, 273], [319, 283, 318], [318, 283, 280], [312, 288, 319], [319, 288, 283], [290, 291, 294], [291, 307, 294], [308, 293, 295], [292, 293, 308], [307, 296, 294], [309, 296, 307], [297, 310, 295], [310, 308, 295], [309, 311, 296], [296, 311, 298], [310, 298, 311], [310, 297, 298], [313, 312, 300], [313, 300, 299], [313, 299, 301], [314, 313, 301], [315, 314, 301], [315, 301, 302], [315, 302, 303], [316, 315, 303], [317, 316, 303], [317, 303, 304], [318, 317, 304], [318, 304, 305], [318, 305, 306], [319, 318, 306], [319, 306, 300], [312, 319, 300]],convexity=10);
